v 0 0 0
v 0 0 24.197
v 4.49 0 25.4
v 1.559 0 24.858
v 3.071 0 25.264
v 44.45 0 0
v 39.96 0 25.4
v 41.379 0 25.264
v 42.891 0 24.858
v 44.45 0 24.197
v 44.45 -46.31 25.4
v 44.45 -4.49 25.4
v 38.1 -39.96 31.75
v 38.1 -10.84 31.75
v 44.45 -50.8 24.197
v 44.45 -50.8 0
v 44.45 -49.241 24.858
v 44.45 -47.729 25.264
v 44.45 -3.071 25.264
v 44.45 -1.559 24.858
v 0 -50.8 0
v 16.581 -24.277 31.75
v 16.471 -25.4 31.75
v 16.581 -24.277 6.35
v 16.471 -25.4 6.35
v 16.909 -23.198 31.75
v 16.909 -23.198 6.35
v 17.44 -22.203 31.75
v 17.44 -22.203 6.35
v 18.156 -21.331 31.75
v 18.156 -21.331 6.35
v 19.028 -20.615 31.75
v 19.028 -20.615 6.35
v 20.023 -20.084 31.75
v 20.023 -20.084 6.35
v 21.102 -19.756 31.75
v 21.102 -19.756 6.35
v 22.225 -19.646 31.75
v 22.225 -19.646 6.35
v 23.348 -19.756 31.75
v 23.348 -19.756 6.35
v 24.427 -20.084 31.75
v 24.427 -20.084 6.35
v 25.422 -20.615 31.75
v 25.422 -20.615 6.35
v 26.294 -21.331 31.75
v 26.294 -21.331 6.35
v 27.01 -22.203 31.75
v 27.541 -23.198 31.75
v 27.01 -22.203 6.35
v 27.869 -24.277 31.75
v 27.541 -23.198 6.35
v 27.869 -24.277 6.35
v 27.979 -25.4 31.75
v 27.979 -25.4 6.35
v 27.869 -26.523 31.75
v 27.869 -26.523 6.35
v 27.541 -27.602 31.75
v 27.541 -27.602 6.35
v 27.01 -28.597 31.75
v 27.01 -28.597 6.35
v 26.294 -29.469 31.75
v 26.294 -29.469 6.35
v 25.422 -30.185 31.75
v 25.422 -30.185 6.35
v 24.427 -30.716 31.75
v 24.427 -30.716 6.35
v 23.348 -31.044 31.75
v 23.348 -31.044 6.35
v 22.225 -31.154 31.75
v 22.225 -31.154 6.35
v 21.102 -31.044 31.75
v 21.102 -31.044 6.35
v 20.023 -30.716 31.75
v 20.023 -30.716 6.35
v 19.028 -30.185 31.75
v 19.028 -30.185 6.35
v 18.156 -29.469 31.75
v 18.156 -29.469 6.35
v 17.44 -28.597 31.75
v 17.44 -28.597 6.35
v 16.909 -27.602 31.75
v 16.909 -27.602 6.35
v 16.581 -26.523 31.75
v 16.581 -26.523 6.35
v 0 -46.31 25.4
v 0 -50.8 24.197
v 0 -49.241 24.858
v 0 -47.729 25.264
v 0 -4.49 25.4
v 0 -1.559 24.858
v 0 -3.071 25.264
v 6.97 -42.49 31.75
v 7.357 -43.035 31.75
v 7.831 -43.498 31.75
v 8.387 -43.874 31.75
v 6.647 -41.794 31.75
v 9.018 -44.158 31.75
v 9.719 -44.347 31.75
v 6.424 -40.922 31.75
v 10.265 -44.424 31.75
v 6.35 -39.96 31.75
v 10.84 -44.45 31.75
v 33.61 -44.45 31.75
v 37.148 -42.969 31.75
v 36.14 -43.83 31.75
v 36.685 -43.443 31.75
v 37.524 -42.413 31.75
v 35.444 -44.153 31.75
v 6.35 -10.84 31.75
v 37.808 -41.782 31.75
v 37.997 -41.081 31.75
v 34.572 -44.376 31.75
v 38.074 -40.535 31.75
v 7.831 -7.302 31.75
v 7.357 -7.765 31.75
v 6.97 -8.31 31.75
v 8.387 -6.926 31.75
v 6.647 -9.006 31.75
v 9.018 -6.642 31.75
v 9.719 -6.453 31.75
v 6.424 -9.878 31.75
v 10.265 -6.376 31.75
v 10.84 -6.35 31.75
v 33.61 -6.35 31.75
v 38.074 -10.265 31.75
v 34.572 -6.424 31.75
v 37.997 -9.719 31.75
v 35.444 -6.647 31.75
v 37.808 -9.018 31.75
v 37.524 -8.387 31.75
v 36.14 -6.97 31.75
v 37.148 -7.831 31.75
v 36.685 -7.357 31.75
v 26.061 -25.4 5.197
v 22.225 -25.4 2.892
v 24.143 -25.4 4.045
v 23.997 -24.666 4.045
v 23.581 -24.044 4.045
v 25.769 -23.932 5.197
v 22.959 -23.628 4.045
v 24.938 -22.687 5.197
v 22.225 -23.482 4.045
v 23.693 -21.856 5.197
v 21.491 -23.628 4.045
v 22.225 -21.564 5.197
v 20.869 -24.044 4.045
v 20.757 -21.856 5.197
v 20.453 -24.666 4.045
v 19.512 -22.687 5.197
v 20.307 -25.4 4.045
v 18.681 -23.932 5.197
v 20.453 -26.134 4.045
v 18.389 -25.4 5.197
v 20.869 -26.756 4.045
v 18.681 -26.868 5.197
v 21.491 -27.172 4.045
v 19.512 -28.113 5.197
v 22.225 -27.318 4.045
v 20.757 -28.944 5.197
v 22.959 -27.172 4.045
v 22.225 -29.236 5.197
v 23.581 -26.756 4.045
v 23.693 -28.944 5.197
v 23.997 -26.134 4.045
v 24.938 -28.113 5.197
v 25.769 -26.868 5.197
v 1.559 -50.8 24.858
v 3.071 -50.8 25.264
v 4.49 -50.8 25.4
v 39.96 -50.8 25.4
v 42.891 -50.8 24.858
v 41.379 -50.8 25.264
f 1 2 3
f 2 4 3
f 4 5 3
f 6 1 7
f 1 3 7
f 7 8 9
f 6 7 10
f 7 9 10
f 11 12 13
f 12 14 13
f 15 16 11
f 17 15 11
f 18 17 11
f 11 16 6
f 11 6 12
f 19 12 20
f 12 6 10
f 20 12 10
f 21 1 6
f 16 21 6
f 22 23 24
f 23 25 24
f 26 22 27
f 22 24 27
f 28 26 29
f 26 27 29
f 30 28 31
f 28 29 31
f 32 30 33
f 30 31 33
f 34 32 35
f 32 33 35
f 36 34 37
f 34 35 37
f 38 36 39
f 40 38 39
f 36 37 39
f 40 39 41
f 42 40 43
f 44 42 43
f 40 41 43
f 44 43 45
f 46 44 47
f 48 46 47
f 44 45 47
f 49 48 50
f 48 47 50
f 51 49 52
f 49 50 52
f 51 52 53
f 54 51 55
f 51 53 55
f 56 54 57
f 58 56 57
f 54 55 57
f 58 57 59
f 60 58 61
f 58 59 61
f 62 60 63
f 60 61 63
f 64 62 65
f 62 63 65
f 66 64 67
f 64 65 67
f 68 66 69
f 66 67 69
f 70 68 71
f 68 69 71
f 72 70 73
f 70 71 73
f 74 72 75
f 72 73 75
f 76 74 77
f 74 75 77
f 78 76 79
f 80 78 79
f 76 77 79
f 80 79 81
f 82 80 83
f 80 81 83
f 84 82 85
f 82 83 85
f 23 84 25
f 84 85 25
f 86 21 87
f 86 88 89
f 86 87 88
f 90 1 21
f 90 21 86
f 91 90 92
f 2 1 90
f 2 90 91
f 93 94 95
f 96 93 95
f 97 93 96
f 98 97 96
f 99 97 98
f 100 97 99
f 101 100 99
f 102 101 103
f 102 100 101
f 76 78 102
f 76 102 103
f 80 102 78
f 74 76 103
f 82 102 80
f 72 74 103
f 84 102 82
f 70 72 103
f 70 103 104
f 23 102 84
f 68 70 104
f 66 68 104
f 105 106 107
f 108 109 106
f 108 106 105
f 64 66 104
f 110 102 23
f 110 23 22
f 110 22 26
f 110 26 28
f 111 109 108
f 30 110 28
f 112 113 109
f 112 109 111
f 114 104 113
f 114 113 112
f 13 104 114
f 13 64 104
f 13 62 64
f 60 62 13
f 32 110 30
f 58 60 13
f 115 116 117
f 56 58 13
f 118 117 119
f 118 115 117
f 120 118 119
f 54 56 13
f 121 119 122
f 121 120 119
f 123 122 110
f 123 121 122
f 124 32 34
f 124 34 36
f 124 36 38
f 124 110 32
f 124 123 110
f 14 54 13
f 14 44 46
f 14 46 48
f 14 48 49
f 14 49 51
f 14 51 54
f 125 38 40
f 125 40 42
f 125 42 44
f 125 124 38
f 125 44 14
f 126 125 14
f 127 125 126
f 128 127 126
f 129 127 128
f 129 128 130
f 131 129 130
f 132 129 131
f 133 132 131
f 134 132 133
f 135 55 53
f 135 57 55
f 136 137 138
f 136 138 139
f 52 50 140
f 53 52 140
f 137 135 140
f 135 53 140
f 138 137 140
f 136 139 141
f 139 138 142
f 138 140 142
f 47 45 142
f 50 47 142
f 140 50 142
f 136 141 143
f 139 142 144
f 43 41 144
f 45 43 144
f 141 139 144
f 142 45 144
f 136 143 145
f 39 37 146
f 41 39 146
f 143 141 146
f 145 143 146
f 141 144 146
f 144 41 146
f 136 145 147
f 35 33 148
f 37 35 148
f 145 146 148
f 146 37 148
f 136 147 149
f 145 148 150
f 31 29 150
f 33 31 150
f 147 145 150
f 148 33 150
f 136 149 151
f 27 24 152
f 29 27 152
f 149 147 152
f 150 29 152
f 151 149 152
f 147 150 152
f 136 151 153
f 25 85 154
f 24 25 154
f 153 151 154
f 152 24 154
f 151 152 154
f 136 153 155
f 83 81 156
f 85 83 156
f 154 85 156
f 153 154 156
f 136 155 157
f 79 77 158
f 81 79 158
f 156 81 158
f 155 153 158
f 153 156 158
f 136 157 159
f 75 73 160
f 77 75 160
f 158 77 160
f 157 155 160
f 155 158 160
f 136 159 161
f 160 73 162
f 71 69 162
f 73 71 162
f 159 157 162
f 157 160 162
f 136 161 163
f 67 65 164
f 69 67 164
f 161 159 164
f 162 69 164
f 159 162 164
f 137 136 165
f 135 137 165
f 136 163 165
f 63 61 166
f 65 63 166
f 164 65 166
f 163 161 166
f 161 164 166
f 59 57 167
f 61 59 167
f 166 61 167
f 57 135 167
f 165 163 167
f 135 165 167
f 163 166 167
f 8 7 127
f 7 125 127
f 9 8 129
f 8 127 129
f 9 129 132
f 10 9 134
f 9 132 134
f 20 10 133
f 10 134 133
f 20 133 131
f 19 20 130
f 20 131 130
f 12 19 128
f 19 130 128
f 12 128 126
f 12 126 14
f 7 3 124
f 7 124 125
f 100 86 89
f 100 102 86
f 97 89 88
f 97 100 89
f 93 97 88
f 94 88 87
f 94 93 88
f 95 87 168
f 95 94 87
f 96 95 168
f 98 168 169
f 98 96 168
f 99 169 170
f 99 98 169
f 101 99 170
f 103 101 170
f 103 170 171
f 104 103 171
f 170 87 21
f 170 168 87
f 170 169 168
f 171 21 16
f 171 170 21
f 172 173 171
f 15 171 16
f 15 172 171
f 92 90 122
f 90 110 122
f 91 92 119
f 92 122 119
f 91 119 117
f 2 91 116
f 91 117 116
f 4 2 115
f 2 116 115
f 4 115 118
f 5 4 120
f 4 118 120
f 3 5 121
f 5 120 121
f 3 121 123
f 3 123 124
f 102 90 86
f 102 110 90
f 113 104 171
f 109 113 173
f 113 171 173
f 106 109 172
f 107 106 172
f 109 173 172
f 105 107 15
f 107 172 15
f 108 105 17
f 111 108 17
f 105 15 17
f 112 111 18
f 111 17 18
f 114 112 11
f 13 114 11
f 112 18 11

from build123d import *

# Parameters (mm, degrees)
F0_W     = 44.45
F0_H     = 31.75
F1_DEPTH = 50.8
F3_SIZE2 = 6.35
F3_SIZE  = 6.35
F4_R     = 6.35
F5_D     = 11.50874
F5_DEPTH = 25.4
F5_TIP   = 3.4575743203


with BuildPart() as f1:
    # F0 (on Front) → F1 (new body)
    with BuildSketch(Plane.XZ):
        with Locations((22.225, 15.875)):
            Rectangle(F0_W, F0_H)
    extrude(amount=F1_DEPTH)

    # F3
    f3_edges = [f1.edges().sort_by_distance(p)[0] for p in [
        (0, -25.4, 31.75),
        (22.225, -50.8, 31.75),
        (44.45, -25.4, 31.75),
        (22.225, 0, 31.75),
    ]]
    chamfer(f3_edges, length=F3_SIZE, length2=F3_SIZE2)

    # F4
    f4_edges = [f1.edges().sort_by_distance(p)[0] for p in [
        (41.275, -47.625, 28.575),
        (41.275, -3.175, 28.575),
        (3.175, -3.175, 28.575),
        (3.175, -47.625, 28.575),
    ]]
    fillet(f4_edges, radius=F4_R)

    # F5
    with Locations(Plane.XY.offset(31.75)):
        with Locations((22.225, -25.4)):
            Hole(F5_D / 2, depth=F5_DEPTH)
            with Locations((0, 0, -(F5_DEPTH + F5_TIP / 2))):  # 118° drill point
                Cone(0, F5_D / 2, F5_TIP, mode=Mode.SUBTRACT)


solid = f1.part
